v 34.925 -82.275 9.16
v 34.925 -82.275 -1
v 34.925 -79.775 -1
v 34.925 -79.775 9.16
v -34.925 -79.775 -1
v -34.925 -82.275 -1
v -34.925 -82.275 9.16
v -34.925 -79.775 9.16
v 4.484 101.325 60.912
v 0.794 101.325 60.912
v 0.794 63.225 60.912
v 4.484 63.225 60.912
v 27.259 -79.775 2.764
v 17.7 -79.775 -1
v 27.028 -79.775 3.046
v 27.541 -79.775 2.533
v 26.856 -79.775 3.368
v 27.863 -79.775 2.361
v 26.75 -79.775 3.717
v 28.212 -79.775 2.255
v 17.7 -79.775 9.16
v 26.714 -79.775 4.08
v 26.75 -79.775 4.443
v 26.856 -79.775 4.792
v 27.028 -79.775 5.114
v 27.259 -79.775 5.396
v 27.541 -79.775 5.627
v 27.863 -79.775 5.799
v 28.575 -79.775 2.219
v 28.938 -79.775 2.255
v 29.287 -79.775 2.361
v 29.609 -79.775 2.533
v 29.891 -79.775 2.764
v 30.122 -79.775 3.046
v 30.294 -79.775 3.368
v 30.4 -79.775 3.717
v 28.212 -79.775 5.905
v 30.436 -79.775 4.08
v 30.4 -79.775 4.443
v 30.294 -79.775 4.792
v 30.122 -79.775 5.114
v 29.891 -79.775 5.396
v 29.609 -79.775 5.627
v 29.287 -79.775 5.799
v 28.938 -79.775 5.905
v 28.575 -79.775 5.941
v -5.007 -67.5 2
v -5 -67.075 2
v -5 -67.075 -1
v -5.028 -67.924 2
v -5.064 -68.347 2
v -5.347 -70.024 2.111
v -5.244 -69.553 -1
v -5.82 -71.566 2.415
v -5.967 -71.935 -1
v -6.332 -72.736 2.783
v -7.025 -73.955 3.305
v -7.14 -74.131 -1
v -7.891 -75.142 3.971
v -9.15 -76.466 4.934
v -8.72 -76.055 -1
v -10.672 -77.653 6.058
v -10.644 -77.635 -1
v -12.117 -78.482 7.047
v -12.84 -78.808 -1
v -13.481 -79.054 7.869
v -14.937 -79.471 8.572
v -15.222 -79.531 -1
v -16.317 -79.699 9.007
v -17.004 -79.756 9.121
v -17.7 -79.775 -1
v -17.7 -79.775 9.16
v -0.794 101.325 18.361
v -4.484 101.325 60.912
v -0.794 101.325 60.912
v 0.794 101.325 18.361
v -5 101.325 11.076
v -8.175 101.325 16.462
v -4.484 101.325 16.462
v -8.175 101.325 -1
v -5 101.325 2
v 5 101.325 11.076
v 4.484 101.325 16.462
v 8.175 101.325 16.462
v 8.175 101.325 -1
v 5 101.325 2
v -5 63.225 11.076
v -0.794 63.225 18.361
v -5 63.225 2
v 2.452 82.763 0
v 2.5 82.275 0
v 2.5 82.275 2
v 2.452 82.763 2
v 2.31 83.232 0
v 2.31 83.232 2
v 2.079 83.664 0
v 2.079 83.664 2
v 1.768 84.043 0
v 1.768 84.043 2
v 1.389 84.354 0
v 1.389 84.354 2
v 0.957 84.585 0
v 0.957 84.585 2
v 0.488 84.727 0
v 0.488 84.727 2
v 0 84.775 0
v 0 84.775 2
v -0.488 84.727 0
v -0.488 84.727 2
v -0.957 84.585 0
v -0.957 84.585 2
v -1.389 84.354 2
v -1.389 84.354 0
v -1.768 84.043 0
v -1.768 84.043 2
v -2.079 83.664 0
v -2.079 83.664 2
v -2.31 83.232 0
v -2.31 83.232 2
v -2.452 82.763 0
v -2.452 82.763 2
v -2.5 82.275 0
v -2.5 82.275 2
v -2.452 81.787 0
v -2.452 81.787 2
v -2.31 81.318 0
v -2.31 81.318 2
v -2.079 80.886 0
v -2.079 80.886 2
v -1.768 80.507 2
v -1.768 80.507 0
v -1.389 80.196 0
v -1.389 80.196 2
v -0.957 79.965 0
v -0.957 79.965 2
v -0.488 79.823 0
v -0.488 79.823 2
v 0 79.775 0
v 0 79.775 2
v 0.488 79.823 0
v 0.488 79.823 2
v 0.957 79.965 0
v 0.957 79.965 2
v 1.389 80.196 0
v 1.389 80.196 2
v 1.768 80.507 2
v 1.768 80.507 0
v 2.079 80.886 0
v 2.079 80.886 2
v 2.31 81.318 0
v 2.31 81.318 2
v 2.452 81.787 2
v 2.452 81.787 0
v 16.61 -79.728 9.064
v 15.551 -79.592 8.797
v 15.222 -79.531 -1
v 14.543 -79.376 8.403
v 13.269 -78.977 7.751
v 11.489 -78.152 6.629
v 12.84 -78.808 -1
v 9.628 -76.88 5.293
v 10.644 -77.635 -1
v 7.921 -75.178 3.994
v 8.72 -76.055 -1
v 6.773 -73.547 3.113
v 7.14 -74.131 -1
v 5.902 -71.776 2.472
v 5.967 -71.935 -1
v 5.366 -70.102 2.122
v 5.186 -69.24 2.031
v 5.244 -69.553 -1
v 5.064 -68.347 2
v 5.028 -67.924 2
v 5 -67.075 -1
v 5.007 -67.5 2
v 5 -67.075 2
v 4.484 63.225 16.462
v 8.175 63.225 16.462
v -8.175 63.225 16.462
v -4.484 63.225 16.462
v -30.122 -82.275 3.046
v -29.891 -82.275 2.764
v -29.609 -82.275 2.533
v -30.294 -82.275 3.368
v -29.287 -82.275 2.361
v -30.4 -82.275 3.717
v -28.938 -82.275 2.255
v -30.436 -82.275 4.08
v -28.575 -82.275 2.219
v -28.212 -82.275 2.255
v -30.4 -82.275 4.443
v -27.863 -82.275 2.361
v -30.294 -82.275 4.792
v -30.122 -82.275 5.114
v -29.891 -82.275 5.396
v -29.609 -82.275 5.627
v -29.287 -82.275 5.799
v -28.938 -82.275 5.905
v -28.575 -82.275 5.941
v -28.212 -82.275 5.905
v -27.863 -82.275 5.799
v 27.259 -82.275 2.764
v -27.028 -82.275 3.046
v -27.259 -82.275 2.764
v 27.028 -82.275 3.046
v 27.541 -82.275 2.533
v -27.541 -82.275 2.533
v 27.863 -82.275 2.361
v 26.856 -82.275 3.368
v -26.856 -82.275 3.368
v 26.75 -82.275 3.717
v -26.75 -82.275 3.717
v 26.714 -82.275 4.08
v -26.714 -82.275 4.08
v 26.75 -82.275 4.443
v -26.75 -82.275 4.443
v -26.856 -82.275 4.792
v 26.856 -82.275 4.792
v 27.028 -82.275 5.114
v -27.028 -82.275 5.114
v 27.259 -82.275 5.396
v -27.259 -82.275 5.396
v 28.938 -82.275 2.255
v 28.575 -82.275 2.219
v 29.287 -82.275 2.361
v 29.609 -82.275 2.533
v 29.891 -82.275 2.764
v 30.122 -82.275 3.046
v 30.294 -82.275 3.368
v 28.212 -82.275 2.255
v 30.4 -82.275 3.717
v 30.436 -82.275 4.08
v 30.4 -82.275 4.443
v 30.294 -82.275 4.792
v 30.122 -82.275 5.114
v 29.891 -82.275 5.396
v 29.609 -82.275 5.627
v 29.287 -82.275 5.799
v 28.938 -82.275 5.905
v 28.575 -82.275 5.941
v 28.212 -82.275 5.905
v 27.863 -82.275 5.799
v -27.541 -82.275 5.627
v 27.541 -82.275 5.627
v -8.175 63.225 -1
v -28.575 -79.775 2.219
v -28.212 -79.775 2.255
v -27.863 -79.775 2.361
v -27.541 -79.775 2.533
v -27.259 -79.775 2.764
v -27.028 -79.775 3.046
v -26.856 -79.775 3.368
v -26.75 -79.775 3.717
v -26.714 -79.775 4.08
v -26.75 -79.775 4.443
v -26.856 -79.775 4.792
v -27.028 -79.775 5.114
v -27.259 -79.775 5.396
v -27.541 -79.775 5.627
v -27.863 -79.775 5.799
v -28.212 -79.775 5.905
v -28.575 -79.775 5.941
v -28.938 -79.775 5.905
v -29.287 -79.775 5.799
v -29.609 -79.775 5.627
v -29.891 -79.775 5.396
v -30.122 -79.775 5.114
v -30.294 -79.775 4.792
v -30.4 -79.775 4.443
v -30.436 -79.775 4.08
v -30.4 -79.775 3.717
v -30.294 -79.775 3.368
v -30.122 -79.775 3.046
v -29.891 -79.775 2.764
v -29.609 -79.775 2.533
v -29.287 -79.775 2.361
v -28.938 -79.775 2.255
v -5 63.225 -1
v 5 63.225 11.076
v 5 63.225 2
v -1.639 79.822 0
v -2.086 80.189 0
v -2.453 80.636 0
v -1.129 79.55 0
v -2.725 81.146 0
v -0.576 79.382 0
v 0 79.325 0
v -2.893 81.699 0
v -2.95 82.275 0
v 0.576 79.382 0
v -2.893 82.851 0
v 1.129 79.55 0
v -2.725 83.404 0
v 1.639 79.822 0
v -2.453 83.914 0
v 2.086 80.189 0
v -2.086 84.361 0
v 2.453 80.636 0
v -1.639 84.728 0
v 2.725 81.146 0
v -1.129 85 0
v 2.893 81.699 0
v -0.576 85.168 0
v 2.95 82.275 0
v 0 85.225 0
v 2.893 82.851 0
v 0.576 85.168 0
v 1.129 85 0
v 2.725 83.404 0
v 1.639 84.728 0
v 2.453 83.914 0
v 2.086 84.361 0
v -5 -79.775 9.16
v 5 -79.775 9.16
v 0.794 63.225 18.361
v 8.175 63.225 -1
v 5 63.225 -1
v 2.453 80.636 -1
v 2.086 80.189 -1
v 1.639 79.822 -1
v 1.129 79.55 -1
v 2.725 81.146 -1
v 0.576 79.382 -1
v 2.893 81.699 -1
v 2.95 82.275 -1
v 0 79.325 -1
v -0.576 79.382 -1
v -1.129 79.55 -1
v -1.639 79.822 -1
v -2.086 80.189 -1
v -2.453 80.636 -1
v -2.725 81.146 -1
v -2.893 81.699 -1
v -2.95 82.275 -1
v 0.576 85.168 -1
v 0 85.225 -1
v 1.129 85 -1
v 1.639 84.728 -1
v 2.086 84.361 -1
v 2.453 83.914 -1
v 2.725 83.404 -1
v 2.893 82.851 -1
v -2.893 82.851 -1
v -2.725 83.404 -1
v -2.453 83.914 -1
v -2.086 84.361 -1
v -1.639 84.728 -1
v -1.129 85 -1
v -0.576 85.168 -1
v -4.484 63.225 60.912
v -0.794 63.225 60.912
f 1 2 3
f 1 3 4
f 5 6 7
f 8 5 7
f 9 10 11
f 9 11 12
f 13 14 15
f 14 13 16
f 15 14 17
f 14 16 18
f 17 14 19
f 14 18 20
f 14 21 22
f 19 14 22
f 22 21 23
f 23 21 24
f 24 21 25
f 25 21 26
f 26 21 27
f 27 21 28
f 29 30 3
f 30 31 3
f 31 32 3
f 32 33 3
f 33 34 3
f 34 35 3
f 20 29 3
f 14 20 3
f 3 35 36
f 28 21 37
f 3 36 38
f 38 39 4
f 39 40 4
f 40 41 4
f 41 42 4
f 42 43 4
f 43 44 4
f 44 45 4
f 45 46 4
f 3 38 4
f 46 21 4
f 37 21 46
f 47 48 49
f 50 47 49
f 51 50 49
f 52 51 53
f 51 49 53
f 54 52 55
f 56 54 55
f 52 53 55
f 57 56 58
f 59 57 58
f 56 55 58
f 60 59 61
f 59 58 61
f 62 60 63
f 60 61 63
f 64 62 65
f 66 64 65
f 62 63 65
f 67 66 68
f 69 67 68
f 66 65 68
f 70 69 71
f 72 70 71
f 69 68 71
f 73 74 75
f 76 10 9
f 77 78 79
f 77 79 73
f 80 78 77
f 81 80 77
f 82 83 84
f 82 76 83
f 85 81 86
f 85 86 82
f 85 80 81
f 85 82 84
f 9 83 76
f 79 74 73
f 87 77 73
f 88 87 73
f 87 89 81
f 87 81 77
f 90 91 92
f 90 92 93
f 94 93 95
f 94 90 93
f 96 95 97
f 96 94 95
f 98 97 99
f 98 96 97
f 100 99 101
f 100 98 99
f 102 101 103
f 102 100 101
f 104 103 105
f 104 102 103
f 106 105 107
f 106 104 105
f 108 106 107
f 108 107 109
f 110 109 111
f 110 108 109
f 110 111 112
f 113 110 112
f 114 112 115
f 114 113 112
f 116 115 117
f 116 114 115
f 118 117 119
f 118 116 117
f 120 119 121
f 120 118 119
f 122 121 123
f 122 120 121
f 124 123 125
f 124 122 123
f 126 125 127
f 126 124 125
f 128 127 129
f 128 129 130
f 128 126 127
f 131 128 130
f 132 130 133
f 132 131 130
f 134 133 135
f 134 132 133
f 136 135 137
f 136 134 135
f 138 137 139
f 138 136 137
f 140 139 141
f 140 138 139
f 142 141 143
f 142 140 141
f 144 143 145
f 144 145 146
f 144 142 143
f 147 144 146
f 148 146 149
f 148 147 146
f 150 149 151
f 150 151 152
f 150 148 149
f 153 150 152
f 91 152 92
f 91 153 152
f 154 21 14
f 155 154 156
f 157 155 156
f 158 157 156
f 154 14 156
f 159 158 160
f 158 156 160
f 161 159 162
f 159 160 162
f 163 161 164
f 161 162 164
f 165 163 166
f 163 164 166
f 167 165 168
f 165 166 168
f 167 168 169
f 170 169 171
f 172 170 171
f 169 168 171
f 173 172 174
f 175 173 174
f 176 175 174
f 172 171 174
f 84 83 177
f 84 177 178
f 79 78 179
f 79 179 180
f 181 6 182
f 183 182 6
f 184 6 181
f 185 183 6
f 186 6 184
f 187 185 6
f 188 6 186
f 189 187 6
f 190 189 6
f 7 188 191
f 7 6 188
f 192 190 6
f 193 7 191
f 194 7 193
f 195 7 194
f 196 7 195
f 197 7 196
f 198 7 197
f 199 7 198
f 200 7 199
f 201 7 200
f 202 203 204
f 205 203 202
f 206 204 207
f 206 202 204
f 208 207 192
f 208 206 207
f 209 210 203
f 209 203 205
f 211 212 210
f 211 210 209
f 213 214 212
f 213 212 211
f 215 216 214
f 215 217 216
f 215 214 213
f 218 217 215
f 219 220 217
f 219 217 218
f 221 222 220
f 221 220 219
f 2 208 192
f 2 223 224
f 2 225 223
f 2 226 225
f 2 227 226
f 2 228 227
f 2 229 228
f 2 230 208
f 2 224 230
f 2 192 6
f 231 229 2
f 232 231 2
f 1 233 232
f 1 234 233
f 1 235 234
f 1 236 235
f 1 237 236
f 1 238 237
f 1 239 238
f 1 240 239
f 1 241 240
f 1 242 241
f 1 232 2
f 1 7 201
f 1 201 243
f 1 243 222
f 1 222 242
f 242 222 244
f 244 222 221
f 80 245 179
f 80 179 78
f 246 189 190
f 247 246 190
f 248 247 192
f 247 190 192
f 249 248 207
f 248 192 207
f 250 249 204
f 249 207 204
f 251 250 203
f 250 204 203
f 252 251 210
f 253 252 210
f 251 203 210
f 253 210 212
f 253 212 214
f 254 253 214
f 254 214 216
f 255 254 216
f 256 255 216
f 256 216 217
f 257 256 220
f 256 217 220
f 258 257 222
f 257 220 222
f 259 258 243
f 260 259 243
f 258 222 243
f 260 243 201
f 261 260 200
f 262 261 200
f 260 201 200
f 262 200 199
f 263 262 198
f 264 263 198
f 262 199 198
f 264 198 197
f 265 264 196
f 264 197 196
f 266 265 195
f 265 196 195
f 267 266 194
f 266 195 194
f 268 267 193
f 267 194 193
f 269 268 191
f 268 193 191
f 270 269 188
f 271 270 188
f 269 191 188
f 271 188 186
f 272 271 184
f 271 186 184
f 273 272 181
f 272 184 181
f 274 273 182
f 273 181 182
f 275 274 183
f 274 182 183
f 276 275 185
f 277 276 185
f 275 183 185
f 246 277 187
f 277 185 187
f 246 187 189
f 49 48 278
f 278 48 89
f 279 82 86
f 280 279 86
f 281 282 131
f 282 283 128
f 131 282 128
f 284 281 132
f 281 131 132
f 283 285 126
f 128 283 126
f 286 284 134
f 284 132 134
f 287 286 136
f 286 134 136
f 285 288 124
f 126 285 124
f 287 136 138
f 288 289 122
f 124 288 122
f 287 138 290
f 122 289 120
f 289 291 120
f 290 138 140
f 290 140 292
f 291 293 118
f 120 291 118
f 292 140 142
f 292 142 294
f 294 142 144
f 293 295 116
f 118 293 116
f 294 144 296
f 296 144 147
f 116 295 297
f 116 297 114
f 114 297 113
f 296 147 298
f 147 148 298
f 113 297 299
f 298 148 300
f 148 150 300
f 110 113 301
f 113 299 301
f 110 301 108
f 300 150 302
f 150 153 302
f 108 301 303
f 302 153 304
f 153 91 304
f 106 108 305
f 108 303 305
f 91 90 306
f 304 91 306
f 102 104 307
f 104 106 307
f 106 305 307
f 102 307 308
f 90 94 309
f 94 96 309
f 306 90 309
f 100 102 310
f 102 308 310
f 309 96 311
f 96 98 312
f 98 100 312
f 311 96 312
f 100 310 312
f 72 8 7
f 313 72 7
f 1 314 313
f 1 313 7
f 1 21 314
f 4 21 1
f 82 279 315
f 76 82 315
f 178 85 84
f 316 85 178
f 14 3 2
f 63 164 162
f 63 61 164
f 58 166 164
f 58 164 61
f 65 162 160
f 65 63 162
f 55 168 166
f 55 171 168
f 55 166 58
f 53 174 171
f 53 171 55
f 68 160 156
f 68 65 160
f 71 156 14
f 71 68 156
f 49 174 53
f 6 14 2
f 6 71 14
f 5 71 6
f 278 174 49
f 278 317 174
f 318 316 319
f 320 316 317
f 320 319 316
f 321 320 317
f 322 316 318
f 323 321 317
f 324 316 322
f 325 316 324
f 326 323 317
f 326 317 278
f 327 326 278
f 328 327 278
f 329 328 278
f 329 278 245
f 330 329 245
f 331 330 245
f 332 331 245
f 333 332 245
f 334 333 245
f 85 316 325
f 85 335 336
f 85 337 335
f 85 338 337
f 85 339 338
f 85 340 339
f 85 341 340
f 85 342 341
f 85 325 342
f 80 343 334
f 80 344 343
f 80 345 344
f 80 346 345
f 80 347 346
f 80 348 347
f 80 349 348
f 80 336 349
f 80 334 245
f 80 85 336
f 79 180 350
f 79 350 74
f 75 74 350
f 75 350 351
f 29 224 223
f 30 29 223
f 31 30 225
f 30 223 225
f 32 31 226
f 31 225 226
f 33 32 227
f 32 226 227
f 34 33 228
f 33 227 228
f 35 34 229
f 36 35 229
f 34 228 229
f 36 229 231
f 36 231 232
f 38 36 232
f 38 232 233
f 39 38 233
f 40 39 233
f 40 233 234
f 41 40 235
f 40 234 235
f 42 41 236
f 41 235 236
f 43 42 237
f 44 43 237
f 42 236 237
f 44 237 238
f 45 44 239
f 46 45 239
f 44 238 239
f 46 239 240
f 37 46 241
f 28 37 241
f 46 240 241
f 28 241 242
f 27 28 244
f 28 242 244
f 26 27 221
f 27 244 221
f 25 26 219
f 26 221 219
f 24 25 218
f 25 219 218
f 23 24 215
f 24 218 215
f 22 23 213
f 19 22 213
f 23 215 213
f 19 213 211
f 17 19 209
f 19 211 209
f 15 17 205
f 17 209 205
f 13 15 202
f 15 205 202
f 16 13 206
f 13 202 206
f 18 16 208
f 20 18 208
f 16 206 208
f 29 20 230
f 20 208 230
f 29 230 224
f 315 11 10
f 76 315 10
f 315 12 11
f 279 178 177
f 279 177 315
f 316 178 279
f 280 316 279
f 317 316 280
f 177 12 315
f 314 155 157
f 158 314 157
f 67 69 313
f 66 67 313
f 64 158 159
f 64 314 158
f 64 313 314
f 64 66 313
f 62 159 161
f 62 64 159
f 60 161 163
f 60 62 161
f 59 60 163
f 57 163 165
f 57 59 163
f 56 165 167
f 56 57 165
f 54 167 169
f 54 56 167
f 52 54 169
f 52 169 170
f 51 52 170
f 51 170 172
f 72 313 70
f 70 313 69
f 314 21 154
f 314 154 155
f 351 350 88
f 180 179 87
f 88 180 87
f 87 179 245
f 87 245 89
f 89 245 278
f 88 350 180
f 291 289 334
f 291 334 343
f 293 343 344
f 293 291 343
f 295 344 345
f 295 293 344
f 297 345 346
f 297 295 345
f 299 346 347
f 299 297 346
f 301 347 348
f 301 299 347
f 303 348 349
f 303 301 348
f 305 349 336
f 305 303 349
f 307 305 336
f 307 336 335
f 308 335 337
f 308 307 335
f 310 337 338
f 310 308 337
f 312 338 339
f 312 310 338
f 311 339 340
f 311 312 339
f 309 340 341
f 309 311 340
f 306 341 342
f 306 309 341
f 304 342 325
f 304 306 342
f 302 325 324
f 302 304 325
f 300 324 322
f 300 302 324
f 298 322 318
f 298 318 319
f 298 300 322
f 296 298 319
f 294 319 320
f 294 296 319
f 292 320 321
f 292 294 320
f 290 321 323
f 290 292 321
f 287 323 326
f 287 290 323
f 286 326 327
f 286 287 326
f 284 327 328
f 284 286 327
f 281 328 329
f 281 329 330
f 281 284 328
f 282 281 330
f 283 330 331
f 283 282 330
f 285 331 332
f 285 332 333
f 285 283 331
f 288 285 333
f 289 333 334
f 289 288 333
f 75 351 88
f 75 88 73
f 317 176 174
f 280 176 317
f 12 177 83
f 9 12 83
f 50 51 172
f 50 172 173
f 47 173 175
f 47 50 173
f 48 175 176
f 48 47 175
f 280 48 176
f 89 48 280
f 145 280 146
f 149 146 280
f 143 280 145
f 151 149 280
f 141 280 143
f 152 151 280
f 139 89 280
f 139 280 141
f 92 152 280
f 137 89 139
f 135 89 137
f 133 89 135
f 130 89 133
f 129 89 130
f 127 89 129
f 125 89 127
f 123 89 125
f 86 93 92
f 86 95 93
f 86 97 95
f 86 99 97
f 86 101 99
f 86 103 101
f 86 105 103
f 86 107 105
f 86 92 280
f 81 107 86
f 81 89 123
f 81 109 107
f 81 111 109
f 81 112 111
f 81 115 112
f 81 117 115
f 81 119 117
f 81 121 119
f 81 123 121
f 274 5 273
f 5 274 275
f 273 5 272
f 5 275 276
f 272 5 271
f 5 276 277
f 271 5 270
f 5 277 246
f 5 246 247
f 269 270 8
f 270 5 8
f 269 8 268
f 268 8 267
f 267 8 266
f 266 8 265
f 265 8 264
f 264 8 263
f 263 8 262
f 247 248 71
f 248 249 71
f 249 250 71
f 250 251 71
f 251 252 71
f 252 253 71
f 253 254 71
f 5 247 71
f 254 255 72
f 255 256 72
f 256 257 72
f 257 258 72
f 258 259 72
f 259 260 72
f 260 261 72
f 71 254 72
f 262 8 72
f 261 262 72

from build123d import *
from build123d.topology import SkipClean

# Parameters (mm, degrees)
SKETCH1_W           = 10
SKETCH1_H           = 170.55
SKETCH1_R           = 2.5
BOSS_EXTRUDE1_DEPTH = 2
SKETCH2_W           = 10
SKETCH2_H           = 170.55
SKETCH2_R           = 2.95
BOSS_EXTRUDE2_DEPTH = 1
SKETCH3_W           = 69.85
SKETCH3_H           = 10.16
SKETCH3_R           = 1.86055
BOSS_EXTRUDE3_DEPTH = 2.5
FILLET1_START       = -1
FILLET1_DEPTH       = 10.16
FILLET1_START_2     = -17.7000001
FILLET1_2_DEPTH     = 35.4000001
FILLET1_START_3     = -5
FILLET1_3_DEPTH     = 10
SKETCH4_W           = 10
SKETCH4_H           = 13.05
BOSS_EXTRUDE4_DEPTH = 3
SKETCH4_3_W         = 3.175
SKETCH4_3_H         = 38.1
BOSS_EXTRUDE5_DEPTH = 11.1125
SKETCH5_W           = 7.38125
SKETCH5_H           = 38.1
BOSS_EXTRUDE6_DEPTH = 50.8
SKETCH6_W           = 3.690625
SKETCH6_H           = 38.1
CUT_EXTRUDE1_DEPTH  = 44.45
CHAMFER1_SIZE       = 4.7625
CHAMFER1_SIZE_2     = 8.248891971


with BuildPart() as part:
    # Sketch1 → Boss-Extrude1 (new body)
    with BuildSketch(Plane.XY):
        with Locations((0, 3)):
            Rectangle(SKETCH1_W, SKETCH1_H)
        with Locations((0, 82.275)):
            Circle(SKETCH1_R, mode=Mode.SUBTRACT)
    extrude(amount=BOSS_EXTRUDE1_DEPTH)

    # Sketch2 → Boss-Extrude2 (add)
    with BuildSketch(Plane(origin=(0, 0, 0), x_dir=(-1, 0, 0), z_dir=(0, 0, -1))):
        with Locations((0, 3)):
            Rectangle(SKETCH2_W, SKETCH2_H)
        with Locations((0, 82.275)):
            Circle(SKETCH2_R, mode=Mode.SUBTRACT)
    extrude(amount=BOSS_EXTRUDE2_DEPTH)

    # Sketch3 → Boss-Extrude3 (add)
    with BuildSketch(Plane.XZ.offset(82.275)):
        with Locations((0, 4.08)):
            Rectangle(SKETCH3_W, SKETCH3_H)
        with Locations(Location((28.575, 4.08, 0), (0, 0, 270))):
            Circle(SKETCH3_R, mode=Mode.SUBTRACT)
        with Locations(Location((-28.575, 4.08, 0), (0, 0, 270))):
            Circle(SKETCH3_R, mode=Mode.SUBTRACT)
    extrude(amount=-BOSS_EXTRUDE3_DEPTH)

    # Fillet1: read off the stored shape, not the designer's step
    # Fillet1 outline → Fillet1 (add)
    with BuildSketch(Plane.XY.offset(FILLET1_START)):
        with BuildLine():
            Line((5, -79.775), (17.7, -79.775))
            ThreePointArc((17.7, -79.775), (8.719743879, -76.055256121), (5, -67.075))
            Line((5, -67.075), (5, -79.775))
        make_face()
        with BuildLine():
            Line((-17.7, -79.775), (-5, -79.775))
            Line((-5, -79.775), (-5, -67.075))
            ThreePointArc((-5, -67.075), (-8.719743879, -76.055256121), (-17.7, -79.775))
        make_face()
    extrude(amount=FILLET1_DEPTH)

    # Fillet1 2 outline → Fillet1 2 (cut)
    with BuildSketch(Plane.YZ.offset(FILLET1_START_2)):
        with BuildLine():
            Line((-66, 9.16), (-79.775009155, 9.160018885))
            ThreePointArc((-79.775009155, 9.160018885), (-75.089891257, 3.937849653), (-68.347034302, 2))
            Line((-68.347034302, 2), (-66, 2))
            Line((-66, 2), (-66, 9.16))
        make_face()
    extrude(amount=FILLET1_2_DEPTH, mode=Mode.SUBTRACT)

    # Fillet1 3 outline → Fillet1 3 (add)
    with SkipClean():  # the faces are left unmerged after this step: merging them gives an invalid solid
        with BuildSketch(Plane.YZ.offset(FILLET1_START_3)):
            with BuildLine():
                ThreePointArc((-68.347034302, 2), (-75.089891257, 3.937849653), (-79.775009155, 9.160018885))
                Line((-79.775009155, 9.160018885), (-79.775, 0))
                Line((-79.775, 0), (-66, 0))
                Line((-66, 0), (-66, 2))
                Line((-66, 2), (-68.347034302, 2))
            make_face()
        extrude(amount=FILLET1_3_DEPTH)
    add(part.part.scale(1), mode=Mode.REPLACE)  # the faces are merged on a copy

    # Sketch4 → Boss-Extrude4 (add)
    with SkipClean():  # the faces are left unmerged after this step: merging them gives an invalid solid
        with BuildSketch(Plane(origin=(0, 0, -1), x_dir=(-1, 0, 0), z_dir=(0, 0, -1))):
            Polygon((8.175, 63.225), (8.175, 101.325), (5, 101.325), (5, 88.275), (5, 63.225), align=None)
            with Locations((0, 94.8)):
                Rectangle(SKETCH4_W, SKETCH4_H)
            Polygon((-5, 88.275), (-5, 101.325), (-8.175, 101.325), (-8.175, 63.225), (-5, 63.225), align=None)
        extrude(amount=-BOSS_EXTRUDE4_DEPTH)

    # Sketch4<3> → Boss-Extrude5 (add)
    with SkipClean():  # the faces are left unmerged after this step: merging them gives an invalid solid
        with BuildSketch(Plane(origin=(0, 0, -1), x_dir=(-1, 0, 0), z_dir=(0, 0, -1))):
            with Locations((6.5875, 82.275)):
                Rectangle(SKETCH4_3_W, SKETCH4_3_H)
            with Locations((-6.5875, 82.275)):
                Rectangle(SKETCH4_3_W, SKETCH4_3_H)
        extrude(amount=-BOSS_EXTRUDE5_DEPTH)

    # Sketch5 → Boss-Extrude6 (add)
    with SkipClean():  # the faces are left unmerged after this step: merging them gives an invalid solid
        with BuildSketch(Plane.XY.offset(10.1125)):
            with Locations((-4.484375, 82.275)):
                Rectangle(SKETCH5_W, SKETCH5_H)
            with Locations((4.484375, 82.275)):
                Rectangle(SKETCH5_W, SKETCH5_H)
        extrude(amount=BOSS_EXTRUDE6_DEPTH)

    # Sketch6 → Cut-Extrude1 (cut)
    with SkipClean():  # the faces are left unmerged after this step: merging them gives an invalid solid
        with BuildSketch(Plane.XY.offset(60.9125)):
            with Locations((-6.3296875, 82.275)):
                Rectangle(SKETCH6_W, SKETCH6_H)
            with Locations((6.3296875, 82.275)):
                Rectangle(SKETCH6_W, SKETCH6_H)
        extrude(amount=-CUT_EXTRUDE1_DEPTH, mode=Mode.SUBTRACT)

    # Chamfer1
    # the kernel refuses this chamfer: 8.248891971, 4.7625 mm, written as the material it takes off along each edge
    with BuildSketch(Plane(origin=(-0.79375, 122.66559091, 10.1125), x_dir=(-1, 0, 0), z_dir=(0, -1, 0))) as chamfer1_piece_1_section:
        Polygon((CHAMFER1_SIZE, 0), (0, -CHAMFER1_SIZE_2), (0, 0), align=None)
    chamfer1_piece_1 = extrude(amount=80.78118182, mode=Mode.PRIVATE)
    chamfer1_piece_1 = split(chamfer1_piece_1, bisect_by=Plane(origin=(-5, 122.66559091, 10.1125), z_dir=(1, 0, 0)), keep=Keep.TOP, mode=Mode.PRIVATE)
    add(chamfer1_piece_1, mode=Mode.SUBTRACT)
    with BuildSketch(Plane(origin=(0.79375, 122.66559091, 10.1125), x_dir=(1, 0, 0), z_dir=(0, -1, 0))) as chamfer1_piece_2_section:
        Polygon((CHAMFER1_SIZE, 0), (0, CHAMFER1_SIZE_2), (0, 0), align=None)
    chamfer1_piece_2 = extrude(amount=80.78118182, mode=Mode.PRIVATE)
    chamfer1_piece_2 = split(chamfer1_piece_2, bisect_by=Plane(origin=(5, 122.66559091, 10.1125), z_dir=(-1, 0, 0)), keep=Keep.TOP, mode=Mode.PRIVATE)
    add(chamfer1_piece_2, mode=Mode.SUBTRACT)


solid = part.part
